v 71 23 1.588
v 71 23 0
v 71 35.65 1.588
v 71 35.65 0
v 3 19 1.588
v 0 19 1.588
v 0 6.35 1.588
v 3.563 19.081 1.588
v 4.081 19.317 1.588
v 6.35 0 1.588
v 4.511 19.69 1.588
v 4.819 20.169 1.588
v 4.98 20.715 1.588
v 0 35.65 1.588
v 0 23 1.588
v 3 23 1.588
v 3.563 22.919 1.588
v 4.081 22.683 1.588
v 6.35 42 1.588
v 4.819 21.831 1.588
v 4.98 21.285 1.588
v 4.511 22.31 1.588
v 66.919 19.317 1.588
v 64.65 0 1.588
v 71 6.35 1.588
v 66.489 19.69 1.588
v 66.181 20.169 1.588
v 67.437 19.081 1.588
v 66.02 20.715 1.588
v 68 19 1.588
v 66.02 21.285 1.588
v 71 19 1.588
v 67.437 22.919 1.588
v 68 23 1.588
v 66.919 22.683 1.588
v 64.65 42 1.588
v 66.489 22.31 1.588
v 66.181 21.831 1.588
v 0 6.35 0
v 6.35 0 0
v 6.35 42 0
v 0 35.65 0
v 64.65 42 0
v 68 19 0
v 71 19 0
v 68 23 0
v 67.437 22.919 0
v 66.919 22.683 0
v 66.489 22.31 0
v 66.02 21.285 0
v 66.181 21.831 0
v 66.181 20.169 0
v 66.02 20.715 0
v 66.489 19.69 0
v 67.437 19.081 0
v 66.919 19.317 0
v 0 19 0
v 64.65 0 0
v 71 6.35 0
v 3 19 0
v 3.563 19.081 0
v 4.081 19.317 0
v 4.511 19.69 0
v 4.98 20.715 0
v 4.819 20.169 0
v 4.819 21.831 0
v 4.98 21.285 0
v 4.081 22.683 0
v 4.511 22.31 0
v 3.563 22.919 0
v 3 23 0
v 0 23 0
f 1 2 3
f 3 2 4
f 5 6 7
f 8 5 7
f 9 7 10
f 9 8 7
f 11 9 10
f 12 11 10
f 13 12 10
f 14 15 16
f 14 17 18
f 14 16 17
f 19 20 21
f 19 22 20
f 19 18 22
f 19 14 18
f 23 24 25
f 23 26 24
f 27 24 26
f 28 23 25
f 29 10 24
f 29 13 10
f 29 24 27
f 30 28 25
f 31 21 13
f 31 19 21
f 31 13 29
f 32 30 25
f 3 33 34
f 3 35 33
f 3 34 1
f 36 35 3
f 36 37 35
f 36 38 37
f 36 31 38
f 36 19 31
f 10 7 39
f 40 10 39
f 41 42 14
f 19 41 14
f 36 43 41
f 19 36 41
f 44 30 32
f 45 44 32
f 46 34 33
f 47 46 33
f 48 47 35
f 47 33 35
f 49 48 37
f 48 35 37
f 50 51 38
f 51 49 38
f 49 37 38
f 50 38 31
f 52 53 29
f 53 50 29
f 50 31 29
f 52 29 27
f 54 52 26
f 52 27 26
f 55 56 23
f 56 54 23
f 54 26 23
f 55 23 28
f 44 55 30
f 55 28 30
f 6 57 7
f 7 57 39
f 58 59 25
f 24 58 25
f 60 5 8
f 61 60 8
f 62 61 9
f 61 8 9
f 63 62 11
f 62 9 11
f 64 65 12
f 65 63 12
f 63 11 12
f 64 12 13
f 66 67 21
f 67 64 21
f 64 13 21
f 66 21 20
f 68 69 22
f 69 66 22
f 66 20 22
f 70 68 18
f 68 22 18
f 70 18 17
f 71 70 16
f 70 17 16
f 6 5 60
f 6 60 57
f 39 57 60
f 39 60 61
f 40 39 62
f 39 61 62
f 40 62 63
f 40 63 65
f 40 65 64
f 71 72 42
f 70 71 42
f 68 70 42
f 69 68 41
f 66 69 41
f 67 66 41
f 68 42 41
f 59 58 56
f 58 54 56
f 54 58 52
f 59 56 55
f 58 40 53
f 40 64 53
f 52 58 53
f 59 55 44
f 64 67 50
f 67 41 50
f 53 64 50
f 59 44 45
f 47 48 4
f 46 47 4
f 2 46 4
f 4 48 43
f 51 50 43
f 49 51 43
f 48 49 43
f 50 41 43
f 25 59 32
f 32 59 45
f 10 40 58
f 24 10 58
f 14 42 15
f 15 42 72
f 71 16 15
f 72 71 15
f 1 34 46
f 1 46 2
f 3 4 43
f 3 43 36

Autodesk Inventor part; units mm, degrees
ref_plane "YZ Plane" through (0, 0, 0) normal (1, 0, 0) x (0, 1, 0)
ref_plane "XZ Plane" through (0, 0, 0) normal (0, 1, 0) x (-1, 0, 0)
ref_plane "XY Plane" through (0, 0, 0) normal (0, 0, 1) x (1, 0, 0)
sketch "Sketch1" plane through (0, 0, 0) normal (0, 0, 1) x (1, 0, 0)
  line L0 (0, 0) -> (71, 0)
  line L1 (71, 0) -> (71, 42)
  line L2 (71, 42) -> (0, 42)
  line L3 (0, 42) -> (0, 0)
  dimension "d0" = 71
  dimension "d1" = 42
extrude "Extrusion1" add sketch "Sketch1" along normal blind 1.5875
chamfer "Chamfer1" distance 6.35 angle 45 4 edges at (0, 42, 0.7937) (0, 0, 0.7937) (71, 0, 0.7937) (71, 42, 0.7937)
sketch "Sketch2" plane through (0, 0, 1.5875) normal (0, 0, 1) x (1, 0, 0)
  line L0 (0, 6.35) -> (0, 35.65) projected
  line L1 (71, 35.65) -> (71, 6.35) projected
  circle A0 centre (3, 21) radius 2
  circle A1 centre (68, 21) radius 2
  line L2 (5, 21) -> (5, 26.1458)
  line L3 (3, 23) -> (0, 23)
  line L4 (3, 19) -> (0, 19)
  line L5 (66, 18.2827) -> (66, 24.0716)
  line L6 (68, 23) -> (71, 23)
  line L7 (68, 19) -> (71, 19)
  line L8 (71, 19) -> (71, 23)
  line L9 (0, 19) -> (0, 23)
  point P0 (0, 0)
  dimension "d7" = 4
  dimension "d8" = 4
  dimension "d10" = 5
  dimension "d11" = 5
extrude "Extrusion2" cut sketch "Sketch2" against normal blind 1.5875
sketch "Sketch3" plane through (0, 0, 1.5875) normal (0, 0, 1) x (1, 0, 0)
  line L0 (71, 19) -> (71, 6.35) projected
  line L1 (1.5875, 42) -> (69.4125, 42)
  line L2 (69.4125, 42) -> (69.4125, 0)
  line L3 (69.4125, 0) -> (1.5875, 0)
  line L4 (1.5875, 0) -> (1.5875, 42)
  line L5 (0, 40.64) -> (63.5, 40.64)
  line L6 (63.5, 40.64) -> (63.5, 0)
  line L7 (63.5, 0) -> (0, 0)
  line L8 (0, 0) -> (0, 40.64)
  point P0 (0, 0)
  dimension "d14" = 67.825
  dimension "d15" = 1.5875
  dimension "d16" = 63.5
  dimension "d17" = 42
  dimension "d18" = 40.64
properties part number "ElectronicsBoard" material "Phenolic"
